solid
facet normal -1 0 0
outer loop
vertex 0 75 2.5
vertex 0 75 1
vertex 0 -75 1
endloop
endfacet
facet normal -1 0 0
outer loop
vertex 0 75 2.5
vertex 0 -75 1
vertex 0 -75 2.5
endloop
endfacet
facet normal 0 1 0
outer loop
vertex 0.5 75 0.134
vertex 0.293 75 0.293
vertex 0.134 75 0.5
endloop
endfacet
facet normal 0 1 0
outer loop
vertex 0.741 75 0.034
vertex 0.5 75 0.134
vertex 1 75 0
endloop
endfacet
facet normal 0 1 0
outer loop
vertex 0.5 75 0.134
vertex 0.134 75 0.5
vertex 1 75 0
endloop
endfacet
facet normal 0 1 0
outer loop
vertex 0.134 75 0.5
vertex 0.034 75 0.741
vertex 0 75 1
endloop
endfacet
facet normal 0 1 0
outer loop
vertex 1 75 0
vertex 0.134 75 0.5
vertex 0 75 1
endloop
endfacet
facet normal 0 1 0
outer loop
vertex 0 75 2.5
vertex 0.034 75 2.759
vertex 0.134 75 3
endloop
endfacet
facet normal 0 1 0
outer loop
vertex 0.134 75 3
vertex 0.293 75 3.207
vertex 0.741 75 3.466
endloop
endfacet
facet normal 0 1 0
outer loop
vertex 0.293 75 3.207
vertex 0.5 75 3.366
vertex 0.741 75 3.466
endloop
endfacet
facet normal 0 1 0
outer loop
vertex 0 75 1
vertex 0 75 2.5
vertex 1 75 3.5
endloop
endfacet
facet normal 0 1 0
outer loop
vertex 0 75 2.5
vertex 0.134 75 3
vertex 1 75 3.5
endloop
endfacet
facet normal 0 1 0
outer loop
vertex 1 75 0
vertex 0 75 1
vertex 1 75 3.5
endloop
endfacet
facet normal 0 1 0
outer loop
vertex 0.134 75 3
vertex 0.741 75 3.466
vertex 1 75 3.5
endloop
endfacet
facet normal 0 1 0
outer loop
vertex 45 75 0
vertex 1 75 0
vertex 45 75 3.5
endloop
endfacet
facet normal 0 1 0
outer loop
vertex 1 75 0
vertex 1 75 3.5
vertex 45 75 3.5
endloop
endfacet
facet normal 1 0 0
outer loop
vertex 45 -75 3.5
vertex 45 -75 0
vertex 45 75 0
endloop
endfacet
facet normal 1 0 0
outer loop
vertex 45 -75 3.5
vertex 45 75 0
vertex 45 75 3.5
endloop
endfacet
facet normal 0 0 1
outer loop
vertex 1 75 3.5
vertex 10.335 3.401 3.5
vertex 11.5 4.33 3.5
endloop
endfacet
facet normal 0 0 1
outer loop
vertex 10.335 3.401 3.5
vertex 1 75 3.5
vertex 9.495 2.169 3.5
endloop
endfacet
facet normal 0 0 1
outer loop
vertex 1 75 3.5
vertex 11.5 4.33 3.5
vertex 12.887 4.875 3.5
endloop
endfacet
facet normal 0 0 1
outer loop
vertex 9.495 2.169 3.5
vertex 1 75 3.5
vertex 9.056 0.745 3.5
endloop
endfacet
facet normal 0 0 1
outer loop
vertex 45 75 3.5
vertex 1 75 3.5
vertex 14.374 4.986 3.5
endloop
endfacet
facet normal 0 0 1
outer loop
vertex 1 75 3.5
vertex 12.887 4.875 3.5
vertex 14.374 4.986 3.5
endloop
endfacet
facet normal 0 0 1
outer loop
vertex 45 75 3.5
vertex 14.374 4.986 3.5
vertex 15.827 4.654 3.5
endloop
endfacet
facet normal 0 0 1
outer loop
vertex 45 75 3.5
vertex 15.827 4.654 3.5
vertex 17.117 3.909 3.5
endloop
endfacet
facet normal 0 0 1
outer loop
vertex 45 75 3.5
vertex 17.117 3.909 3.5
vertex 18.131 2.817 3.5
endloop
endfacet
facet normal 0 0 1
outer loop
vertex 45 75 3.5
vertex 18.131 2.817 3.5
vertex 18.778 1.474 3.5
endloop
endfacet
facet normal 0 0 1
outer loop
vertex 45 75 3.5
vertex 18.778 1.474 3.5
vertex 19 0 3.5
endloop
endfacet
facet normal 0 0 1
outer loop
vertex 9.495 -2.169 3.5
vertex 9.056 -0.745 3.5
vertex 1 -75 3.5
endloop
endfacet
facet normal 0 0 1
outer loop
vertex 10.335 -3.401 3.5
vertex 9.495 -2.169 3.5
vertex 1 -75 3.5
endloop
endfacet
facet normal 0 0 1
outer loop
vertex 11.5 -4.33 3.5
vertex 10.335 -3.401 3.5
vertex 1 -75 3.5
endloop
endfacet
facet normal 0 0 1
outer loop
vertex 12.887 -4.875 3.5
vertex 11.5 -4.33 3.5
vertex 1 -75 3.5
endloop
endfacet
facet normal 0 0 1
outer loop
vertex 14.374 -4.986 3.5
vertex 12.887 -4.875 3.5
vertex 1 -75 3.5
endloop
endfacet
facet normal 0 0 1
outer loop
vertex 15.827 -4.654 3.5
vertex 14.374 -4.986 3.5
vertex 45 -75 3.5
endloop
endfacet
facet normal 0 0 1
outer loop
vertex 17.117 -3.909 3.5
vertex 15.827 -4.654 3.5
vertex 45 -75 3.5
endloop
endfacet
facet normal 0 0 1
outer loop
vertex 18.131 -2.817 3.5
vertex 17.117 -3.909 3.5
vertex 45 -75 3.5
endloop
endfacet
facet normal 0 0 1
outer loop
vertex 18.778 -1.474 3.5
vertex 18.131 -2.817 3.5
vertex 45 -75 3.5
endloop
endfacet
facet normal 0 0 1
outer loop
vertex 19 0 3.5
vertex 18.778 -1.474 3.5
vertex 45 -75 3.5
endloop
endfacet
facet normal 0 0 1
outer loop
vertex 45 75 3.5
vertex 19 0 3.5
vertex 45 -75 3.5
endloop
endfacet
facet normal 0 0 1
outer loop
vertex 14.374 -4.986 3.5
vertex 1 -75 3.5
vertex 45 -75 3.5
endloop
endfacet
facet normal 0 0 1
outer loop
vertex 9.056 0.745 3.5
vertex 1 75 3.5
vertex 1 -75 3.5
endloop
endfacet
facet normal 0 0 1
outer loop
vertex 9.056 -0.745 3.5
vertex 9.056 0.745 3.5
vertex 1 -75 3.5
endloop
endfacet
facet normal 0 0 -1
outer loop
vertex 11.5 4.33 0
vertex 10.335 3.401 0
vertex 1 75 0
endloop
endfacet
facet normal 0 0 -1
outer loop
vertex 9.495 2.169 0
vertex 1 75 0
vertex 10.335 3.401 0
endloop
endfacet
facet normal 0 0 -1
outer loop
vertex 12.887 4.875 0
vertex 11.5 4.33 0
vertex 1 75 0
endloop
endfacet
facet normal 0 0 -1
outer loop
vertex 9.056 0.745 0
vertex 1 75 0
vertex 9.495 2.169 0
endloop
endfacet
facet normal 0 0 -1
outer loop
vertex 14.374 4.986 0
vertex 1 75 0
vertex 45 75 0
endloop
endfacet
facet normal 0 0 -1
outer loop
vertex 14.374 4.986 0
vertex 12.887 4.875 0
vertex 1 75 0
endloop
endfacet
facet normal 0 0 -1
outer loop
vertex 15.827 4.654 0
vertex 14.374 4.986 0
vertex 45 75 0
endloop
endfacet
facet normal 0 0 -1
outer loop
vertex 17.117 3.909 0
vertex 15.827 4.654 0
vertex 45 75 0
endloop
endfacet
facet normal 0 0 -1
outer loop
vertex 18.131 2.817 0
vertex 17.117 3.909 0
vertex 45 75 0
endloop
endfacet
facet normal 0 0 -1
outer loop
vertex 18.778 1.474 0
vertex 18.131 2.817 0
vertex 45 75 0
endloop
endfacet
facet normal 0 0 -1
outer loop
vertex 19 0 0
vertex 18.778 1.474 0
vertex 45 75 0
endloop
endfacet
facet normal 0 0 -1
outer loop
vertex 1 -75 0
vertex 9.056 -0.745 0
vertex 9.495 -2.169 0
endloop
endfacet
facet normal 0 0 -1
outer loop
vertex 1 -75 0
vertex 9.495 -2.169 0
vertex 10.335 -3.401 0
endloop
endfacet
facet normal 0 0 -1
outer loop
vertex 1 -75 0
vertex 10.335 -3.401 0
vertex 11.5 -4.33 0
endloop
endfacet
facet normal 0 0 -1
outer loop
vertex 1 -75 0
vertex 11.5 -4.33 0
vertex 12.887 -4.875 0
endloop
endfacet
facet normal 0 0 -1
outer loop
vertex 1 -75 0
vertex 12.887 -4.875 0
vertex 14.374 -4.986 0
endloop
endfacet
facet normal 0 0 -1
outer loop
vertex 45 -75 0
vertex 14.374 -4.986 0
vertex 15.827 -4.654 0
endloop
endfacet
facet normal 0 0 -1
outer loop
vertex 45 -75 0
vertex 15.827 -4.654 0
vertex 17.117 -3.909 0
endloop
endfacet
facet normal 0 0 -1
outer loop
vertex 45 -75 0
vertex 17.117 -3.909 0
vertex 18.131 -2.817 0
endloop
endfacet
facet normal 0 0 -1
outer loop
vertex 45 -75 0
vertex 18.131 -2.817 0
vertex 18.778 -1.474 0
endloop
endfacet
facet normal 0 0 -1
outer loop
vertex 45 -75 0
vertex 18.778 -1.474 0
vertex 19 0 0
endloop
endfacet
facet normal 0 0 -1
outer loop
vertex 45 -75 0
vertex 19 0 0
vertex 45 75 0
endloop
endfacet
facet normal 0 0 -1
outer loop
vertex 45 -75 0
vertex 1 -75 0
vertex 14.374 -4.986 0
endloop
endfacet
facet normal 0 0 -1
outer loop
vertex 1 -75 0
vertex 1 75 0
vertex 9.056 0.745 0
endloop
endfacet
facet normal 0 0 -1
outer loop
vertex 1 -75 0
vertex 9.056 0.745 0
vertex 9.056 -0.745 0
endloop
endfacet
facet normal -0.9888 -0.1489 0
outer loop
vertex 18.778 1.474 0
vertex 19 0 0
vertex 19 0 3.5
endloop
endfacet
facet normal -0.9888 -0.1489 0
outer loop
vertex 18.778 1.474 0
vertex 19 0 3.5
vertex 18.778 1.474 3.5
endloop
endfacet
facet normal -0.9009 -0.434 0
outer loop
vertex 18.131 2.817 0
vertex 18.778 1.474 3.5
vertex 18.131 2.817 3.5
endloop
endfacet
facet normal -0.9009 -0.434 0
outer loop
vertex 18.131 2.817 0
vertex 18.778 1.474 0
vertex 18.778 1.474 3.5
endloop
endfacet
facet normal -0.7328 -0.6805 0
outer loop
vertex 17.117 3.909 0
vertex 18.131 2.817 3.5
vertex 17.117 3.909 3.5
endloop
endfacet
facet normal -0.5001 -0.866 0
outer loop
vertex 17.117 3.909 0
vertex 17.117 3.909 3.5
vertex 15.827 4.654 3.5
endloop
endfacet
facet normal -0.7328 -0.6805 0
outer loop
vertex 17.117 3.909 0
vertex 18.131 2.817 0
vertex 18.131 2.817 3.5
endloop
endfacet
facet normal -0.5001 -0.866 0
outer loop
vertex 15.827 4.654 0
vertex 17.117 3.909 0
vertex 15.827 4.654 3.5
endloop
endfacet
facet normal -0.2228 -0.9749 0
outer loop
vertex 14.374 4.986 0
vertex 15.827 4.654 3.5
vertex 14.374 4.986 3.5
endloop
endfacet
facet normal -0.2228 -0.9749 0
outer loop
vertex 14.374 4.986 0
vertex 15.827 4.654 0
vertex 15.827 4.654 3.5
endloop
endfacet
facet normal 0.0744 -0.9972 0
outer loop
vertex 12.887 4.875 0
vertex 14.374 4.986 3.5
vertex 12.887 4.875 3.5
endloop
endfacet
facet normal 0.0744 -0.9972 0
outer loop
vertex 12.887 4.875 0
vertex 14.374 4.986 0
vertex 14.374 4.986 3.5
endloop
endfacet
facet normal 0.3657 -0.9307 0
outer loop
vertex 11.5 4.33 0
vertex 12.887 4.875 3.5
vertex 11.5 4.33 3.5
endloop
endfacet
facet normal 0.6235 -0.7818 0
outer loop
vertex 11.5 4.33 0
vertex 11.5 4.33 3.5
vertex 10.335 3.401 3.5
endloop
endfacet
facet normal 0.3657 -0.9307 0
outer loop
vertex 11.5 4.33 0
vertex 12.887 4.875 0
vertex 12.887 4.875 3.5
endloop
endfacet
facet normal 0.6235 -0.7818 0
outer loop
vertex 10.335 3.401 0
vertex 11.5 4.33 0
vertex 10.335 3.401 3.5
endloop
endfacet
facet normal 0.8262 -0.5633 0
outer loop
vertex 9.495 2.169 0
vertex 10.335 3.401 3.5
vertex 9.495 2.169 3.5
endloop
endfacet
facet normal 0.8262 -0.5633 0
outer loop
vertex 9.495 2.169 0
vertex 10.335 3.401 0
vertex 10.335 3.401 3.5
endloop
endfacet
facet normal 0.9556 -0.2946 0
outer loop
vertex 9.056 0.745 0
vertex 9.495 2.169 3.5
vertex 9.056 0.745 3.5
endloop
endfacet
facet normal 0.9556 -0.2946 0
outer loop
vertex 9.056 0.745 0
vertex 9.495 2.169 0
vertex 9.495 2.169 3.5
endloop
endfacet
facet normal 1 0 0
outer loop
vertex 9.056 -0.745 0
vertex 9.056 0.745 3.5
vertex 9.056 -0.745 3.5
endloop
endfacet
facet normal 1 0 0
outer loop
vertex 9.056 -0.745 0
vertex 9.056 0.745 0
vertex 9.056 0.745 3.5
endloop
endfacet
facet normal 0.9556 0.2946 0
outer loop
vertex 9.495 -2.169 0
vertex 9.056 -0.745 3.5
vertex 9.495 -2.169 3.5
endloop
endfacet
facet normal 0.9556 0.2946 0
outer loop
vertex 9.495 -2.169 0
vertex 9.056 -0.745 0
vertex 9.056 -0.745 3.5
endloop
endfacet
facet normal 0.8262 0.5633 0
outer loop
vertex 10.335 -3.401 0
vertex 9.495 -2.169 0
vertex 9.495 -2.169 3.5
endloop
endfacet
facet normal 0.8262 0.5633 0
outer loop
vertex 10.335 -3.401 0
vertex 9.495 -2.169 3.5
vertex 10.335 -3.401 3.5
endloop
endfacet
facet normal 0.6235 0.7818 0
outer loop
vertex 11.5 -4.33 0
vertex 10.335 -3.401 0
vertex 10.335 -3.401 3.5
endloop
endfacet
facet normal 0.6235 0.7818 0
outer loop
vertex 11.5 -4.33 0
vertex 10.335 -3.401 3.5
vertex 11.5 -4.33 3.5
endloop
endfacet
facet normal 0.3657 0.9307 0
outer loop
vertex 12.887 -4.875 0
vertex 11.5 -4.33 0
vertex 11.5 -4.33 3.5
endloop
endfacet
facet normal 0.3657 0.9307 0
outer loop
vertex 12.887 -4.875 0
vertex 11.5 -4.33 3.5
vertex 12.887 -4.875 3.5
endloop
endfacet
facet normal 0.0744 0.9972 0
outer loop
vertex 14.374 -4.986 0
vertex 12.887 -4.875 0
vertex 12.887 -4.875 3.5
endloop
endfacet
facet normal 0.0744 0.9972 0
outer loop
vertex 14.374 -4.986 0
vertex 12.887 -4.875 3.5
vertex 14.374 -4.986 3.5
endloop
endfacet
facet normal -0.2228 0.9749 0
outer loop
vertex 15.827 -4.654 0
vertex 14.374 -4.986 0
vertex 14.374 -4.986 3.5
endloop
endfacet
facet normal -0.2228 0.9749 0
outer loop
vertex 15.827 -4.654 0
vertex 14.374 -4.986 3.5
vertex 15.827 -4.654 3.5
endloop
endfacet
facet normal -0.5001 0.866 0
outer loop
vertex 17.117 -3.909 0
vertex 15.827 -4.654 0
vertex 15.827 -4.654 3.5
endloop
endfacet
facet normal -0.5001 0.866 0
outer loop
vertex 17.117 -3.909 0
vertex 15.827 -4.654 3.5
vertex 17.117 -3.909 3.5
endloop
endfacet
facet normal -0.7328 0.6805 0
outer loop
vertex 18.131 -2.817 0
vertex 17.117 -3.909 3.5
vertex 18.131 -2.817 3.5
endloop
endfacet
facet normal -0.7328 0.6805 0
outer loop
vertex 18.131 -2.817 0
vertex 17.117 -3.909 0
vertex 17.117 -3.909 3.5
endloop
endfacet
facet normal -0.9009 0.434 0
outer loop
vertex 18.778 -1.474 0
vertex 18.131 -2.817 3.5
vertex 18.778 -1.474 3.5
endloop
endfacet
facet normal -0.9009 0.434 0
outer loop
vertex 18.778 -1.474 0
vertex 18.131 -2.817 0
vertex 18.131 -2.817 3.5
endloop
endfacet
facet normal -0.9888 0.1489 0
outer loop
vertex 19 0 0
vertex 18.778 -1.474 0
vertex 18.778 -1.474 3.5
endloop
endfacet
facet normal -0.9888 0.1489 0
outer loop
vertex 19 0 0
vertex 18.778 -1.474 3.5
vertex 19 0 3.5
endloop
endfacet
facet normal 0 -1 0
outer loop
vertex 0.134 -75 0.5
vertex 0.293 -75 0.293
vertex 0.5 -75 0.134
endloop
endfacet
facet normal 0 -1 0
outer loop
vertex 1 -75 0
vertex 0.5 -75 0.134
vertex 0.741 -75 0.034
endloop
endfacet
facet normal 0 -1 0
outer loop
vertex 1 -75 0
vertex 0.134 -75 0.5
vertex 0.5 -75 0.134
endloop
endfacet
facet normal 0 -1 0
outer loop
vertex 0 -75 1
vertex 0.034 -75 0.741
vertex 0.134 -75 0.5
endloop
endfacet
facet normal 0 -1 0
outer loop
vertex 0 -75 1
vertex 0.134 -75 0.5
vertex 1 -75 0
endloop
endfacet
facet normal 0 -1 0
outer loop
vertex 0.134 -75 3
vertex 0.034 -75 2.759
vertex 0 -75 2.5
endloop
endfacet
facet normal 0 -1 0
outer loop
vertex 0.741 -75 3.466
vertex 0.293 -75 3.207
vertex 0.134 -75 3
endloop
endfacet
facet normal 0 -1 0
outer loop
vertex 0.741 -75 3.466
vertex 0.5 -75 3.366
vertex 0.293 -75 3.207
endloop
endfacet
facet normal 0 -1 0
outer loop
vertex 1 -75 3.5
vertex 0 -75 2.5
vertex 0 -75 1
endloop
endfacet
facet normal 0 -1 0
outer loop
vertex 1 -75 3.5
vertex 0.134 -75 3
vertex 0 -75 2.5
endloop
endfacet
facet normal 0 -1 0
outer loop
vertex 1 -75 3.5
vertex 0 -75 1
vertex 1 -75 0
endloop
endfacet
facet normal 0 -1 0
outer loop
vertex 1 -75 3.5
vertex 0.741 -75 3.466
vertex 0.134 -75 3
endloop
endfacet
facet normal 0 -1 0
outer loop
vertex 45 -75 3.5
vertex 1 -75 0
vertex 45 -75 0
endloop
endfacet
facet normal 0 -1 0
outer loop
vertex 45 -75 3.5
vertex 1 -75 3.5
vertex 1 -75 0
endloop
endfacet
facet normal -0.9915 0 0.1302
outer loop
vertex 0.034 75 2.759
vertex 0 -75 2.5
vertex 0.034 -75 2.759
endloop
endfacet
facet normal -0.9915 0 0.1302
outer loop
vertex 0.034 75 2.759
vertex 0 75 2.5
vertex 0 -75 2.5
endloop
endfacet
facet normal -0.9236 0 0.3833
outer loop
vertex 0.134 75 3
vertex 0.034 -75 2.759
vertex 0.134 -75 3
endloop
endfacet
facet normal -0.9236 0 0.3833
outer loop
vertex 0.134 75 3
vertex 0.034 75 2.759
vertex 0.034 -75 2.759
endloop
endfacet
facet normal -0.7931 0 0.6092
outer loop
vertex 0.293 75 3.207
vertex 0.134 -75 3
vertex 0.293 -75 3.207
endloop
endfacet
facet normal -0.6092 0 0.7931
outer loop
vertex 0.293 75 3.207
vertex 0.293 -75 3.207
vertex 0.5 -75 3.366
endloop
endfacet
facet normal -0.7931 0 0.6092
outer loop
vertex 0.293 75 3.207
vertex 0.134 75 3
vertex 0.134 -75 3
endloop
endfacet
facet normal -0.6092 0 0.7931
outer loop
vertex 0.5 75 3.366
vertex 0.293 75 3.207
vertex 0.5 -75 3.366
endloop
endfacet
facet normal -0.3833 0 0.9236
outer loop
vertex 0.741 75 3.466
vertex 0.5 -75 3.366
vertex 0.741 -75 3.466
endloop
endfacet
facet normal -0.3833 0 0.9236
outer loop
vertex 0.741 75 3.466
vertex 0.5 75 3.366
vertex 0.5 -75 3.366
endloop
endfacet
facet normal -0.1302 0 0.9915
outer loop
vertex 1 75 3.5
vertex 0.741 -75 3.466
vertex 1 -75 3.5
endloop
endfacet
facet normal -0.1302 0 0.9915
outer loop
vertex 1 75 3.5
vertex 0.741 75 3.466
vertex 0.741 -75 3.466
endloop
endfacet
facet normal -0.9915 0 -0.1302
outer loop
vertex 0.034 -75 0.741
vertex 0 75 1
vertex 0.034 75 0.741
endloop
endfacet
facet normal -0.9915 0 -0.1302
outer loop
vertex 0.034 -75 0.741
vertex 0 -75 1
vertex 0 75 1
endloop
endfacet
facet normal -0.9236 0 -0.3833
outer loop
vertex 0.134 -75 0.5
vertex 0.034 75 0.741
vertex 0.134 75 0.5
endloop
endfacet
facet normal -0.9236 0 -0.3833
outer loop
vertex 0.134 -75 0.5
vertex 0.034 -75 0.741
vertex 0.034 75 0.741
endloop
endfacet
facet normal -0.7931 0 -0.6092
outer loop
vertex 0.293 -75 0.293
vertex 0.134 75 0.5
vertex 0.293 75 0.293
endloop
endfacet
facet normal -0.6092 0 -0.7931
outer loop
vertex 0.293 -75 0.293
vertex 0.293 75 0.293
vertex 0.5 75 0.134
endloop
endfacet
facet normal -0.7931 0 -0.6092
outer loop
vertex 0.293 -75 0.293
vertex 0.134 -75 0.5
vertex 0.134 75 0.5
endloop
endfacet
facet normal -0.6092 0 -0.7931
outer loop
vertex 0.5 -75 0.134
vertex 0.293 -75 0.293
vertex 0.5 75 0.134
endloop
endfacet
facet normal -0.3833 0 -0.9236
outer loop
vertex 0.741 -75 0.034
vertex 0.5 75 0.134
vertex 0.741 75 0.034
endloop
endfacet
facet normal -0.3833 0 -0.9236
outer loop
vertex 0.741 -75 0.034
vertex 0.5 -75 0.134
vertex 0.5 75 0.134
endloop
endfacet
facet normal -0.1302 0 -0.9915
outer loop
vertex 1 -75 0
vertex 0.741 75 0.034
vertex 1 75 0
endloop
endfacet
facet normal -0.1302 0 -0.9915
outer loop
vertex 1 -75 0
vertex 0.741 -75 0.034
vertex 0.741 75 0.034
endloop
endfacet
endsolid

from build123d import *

# Parameters (mm, degrees)
F0_W     = 45
F0_H     = 3.5
F1_DEPTH = 75
F2_R     = 5
F3_DEPTH = 3.5
F4_R     = 1


with BuildPart() as f1:
    # F0 (on Front) → F1 (new body, symmetric)
    with BuildSketch(Plane.XZ):
        with Locations((22.5, 1.75)):
            Rectangle(F0_W, F0_H)
    extrude(amount=F1_DEPTH, both=True)

    # F2 (on Top) → F3 (cut, through all)
    with BuildSketch(Plane.XY):
        with Locations((14, 0)):
            Circle(F2_R)
    extrude(amount=F3_DEPTH, mode=Mode.SUBTRACT)

    # F4
    f4_edges = [f1.edges().sort_by_distance(p)[0] for p in [
        (0, 0, 3.5),
        (0, 0, 0),
    ]]
    fillet(f4_edges, radius=F4_R)


solid = f1.part
